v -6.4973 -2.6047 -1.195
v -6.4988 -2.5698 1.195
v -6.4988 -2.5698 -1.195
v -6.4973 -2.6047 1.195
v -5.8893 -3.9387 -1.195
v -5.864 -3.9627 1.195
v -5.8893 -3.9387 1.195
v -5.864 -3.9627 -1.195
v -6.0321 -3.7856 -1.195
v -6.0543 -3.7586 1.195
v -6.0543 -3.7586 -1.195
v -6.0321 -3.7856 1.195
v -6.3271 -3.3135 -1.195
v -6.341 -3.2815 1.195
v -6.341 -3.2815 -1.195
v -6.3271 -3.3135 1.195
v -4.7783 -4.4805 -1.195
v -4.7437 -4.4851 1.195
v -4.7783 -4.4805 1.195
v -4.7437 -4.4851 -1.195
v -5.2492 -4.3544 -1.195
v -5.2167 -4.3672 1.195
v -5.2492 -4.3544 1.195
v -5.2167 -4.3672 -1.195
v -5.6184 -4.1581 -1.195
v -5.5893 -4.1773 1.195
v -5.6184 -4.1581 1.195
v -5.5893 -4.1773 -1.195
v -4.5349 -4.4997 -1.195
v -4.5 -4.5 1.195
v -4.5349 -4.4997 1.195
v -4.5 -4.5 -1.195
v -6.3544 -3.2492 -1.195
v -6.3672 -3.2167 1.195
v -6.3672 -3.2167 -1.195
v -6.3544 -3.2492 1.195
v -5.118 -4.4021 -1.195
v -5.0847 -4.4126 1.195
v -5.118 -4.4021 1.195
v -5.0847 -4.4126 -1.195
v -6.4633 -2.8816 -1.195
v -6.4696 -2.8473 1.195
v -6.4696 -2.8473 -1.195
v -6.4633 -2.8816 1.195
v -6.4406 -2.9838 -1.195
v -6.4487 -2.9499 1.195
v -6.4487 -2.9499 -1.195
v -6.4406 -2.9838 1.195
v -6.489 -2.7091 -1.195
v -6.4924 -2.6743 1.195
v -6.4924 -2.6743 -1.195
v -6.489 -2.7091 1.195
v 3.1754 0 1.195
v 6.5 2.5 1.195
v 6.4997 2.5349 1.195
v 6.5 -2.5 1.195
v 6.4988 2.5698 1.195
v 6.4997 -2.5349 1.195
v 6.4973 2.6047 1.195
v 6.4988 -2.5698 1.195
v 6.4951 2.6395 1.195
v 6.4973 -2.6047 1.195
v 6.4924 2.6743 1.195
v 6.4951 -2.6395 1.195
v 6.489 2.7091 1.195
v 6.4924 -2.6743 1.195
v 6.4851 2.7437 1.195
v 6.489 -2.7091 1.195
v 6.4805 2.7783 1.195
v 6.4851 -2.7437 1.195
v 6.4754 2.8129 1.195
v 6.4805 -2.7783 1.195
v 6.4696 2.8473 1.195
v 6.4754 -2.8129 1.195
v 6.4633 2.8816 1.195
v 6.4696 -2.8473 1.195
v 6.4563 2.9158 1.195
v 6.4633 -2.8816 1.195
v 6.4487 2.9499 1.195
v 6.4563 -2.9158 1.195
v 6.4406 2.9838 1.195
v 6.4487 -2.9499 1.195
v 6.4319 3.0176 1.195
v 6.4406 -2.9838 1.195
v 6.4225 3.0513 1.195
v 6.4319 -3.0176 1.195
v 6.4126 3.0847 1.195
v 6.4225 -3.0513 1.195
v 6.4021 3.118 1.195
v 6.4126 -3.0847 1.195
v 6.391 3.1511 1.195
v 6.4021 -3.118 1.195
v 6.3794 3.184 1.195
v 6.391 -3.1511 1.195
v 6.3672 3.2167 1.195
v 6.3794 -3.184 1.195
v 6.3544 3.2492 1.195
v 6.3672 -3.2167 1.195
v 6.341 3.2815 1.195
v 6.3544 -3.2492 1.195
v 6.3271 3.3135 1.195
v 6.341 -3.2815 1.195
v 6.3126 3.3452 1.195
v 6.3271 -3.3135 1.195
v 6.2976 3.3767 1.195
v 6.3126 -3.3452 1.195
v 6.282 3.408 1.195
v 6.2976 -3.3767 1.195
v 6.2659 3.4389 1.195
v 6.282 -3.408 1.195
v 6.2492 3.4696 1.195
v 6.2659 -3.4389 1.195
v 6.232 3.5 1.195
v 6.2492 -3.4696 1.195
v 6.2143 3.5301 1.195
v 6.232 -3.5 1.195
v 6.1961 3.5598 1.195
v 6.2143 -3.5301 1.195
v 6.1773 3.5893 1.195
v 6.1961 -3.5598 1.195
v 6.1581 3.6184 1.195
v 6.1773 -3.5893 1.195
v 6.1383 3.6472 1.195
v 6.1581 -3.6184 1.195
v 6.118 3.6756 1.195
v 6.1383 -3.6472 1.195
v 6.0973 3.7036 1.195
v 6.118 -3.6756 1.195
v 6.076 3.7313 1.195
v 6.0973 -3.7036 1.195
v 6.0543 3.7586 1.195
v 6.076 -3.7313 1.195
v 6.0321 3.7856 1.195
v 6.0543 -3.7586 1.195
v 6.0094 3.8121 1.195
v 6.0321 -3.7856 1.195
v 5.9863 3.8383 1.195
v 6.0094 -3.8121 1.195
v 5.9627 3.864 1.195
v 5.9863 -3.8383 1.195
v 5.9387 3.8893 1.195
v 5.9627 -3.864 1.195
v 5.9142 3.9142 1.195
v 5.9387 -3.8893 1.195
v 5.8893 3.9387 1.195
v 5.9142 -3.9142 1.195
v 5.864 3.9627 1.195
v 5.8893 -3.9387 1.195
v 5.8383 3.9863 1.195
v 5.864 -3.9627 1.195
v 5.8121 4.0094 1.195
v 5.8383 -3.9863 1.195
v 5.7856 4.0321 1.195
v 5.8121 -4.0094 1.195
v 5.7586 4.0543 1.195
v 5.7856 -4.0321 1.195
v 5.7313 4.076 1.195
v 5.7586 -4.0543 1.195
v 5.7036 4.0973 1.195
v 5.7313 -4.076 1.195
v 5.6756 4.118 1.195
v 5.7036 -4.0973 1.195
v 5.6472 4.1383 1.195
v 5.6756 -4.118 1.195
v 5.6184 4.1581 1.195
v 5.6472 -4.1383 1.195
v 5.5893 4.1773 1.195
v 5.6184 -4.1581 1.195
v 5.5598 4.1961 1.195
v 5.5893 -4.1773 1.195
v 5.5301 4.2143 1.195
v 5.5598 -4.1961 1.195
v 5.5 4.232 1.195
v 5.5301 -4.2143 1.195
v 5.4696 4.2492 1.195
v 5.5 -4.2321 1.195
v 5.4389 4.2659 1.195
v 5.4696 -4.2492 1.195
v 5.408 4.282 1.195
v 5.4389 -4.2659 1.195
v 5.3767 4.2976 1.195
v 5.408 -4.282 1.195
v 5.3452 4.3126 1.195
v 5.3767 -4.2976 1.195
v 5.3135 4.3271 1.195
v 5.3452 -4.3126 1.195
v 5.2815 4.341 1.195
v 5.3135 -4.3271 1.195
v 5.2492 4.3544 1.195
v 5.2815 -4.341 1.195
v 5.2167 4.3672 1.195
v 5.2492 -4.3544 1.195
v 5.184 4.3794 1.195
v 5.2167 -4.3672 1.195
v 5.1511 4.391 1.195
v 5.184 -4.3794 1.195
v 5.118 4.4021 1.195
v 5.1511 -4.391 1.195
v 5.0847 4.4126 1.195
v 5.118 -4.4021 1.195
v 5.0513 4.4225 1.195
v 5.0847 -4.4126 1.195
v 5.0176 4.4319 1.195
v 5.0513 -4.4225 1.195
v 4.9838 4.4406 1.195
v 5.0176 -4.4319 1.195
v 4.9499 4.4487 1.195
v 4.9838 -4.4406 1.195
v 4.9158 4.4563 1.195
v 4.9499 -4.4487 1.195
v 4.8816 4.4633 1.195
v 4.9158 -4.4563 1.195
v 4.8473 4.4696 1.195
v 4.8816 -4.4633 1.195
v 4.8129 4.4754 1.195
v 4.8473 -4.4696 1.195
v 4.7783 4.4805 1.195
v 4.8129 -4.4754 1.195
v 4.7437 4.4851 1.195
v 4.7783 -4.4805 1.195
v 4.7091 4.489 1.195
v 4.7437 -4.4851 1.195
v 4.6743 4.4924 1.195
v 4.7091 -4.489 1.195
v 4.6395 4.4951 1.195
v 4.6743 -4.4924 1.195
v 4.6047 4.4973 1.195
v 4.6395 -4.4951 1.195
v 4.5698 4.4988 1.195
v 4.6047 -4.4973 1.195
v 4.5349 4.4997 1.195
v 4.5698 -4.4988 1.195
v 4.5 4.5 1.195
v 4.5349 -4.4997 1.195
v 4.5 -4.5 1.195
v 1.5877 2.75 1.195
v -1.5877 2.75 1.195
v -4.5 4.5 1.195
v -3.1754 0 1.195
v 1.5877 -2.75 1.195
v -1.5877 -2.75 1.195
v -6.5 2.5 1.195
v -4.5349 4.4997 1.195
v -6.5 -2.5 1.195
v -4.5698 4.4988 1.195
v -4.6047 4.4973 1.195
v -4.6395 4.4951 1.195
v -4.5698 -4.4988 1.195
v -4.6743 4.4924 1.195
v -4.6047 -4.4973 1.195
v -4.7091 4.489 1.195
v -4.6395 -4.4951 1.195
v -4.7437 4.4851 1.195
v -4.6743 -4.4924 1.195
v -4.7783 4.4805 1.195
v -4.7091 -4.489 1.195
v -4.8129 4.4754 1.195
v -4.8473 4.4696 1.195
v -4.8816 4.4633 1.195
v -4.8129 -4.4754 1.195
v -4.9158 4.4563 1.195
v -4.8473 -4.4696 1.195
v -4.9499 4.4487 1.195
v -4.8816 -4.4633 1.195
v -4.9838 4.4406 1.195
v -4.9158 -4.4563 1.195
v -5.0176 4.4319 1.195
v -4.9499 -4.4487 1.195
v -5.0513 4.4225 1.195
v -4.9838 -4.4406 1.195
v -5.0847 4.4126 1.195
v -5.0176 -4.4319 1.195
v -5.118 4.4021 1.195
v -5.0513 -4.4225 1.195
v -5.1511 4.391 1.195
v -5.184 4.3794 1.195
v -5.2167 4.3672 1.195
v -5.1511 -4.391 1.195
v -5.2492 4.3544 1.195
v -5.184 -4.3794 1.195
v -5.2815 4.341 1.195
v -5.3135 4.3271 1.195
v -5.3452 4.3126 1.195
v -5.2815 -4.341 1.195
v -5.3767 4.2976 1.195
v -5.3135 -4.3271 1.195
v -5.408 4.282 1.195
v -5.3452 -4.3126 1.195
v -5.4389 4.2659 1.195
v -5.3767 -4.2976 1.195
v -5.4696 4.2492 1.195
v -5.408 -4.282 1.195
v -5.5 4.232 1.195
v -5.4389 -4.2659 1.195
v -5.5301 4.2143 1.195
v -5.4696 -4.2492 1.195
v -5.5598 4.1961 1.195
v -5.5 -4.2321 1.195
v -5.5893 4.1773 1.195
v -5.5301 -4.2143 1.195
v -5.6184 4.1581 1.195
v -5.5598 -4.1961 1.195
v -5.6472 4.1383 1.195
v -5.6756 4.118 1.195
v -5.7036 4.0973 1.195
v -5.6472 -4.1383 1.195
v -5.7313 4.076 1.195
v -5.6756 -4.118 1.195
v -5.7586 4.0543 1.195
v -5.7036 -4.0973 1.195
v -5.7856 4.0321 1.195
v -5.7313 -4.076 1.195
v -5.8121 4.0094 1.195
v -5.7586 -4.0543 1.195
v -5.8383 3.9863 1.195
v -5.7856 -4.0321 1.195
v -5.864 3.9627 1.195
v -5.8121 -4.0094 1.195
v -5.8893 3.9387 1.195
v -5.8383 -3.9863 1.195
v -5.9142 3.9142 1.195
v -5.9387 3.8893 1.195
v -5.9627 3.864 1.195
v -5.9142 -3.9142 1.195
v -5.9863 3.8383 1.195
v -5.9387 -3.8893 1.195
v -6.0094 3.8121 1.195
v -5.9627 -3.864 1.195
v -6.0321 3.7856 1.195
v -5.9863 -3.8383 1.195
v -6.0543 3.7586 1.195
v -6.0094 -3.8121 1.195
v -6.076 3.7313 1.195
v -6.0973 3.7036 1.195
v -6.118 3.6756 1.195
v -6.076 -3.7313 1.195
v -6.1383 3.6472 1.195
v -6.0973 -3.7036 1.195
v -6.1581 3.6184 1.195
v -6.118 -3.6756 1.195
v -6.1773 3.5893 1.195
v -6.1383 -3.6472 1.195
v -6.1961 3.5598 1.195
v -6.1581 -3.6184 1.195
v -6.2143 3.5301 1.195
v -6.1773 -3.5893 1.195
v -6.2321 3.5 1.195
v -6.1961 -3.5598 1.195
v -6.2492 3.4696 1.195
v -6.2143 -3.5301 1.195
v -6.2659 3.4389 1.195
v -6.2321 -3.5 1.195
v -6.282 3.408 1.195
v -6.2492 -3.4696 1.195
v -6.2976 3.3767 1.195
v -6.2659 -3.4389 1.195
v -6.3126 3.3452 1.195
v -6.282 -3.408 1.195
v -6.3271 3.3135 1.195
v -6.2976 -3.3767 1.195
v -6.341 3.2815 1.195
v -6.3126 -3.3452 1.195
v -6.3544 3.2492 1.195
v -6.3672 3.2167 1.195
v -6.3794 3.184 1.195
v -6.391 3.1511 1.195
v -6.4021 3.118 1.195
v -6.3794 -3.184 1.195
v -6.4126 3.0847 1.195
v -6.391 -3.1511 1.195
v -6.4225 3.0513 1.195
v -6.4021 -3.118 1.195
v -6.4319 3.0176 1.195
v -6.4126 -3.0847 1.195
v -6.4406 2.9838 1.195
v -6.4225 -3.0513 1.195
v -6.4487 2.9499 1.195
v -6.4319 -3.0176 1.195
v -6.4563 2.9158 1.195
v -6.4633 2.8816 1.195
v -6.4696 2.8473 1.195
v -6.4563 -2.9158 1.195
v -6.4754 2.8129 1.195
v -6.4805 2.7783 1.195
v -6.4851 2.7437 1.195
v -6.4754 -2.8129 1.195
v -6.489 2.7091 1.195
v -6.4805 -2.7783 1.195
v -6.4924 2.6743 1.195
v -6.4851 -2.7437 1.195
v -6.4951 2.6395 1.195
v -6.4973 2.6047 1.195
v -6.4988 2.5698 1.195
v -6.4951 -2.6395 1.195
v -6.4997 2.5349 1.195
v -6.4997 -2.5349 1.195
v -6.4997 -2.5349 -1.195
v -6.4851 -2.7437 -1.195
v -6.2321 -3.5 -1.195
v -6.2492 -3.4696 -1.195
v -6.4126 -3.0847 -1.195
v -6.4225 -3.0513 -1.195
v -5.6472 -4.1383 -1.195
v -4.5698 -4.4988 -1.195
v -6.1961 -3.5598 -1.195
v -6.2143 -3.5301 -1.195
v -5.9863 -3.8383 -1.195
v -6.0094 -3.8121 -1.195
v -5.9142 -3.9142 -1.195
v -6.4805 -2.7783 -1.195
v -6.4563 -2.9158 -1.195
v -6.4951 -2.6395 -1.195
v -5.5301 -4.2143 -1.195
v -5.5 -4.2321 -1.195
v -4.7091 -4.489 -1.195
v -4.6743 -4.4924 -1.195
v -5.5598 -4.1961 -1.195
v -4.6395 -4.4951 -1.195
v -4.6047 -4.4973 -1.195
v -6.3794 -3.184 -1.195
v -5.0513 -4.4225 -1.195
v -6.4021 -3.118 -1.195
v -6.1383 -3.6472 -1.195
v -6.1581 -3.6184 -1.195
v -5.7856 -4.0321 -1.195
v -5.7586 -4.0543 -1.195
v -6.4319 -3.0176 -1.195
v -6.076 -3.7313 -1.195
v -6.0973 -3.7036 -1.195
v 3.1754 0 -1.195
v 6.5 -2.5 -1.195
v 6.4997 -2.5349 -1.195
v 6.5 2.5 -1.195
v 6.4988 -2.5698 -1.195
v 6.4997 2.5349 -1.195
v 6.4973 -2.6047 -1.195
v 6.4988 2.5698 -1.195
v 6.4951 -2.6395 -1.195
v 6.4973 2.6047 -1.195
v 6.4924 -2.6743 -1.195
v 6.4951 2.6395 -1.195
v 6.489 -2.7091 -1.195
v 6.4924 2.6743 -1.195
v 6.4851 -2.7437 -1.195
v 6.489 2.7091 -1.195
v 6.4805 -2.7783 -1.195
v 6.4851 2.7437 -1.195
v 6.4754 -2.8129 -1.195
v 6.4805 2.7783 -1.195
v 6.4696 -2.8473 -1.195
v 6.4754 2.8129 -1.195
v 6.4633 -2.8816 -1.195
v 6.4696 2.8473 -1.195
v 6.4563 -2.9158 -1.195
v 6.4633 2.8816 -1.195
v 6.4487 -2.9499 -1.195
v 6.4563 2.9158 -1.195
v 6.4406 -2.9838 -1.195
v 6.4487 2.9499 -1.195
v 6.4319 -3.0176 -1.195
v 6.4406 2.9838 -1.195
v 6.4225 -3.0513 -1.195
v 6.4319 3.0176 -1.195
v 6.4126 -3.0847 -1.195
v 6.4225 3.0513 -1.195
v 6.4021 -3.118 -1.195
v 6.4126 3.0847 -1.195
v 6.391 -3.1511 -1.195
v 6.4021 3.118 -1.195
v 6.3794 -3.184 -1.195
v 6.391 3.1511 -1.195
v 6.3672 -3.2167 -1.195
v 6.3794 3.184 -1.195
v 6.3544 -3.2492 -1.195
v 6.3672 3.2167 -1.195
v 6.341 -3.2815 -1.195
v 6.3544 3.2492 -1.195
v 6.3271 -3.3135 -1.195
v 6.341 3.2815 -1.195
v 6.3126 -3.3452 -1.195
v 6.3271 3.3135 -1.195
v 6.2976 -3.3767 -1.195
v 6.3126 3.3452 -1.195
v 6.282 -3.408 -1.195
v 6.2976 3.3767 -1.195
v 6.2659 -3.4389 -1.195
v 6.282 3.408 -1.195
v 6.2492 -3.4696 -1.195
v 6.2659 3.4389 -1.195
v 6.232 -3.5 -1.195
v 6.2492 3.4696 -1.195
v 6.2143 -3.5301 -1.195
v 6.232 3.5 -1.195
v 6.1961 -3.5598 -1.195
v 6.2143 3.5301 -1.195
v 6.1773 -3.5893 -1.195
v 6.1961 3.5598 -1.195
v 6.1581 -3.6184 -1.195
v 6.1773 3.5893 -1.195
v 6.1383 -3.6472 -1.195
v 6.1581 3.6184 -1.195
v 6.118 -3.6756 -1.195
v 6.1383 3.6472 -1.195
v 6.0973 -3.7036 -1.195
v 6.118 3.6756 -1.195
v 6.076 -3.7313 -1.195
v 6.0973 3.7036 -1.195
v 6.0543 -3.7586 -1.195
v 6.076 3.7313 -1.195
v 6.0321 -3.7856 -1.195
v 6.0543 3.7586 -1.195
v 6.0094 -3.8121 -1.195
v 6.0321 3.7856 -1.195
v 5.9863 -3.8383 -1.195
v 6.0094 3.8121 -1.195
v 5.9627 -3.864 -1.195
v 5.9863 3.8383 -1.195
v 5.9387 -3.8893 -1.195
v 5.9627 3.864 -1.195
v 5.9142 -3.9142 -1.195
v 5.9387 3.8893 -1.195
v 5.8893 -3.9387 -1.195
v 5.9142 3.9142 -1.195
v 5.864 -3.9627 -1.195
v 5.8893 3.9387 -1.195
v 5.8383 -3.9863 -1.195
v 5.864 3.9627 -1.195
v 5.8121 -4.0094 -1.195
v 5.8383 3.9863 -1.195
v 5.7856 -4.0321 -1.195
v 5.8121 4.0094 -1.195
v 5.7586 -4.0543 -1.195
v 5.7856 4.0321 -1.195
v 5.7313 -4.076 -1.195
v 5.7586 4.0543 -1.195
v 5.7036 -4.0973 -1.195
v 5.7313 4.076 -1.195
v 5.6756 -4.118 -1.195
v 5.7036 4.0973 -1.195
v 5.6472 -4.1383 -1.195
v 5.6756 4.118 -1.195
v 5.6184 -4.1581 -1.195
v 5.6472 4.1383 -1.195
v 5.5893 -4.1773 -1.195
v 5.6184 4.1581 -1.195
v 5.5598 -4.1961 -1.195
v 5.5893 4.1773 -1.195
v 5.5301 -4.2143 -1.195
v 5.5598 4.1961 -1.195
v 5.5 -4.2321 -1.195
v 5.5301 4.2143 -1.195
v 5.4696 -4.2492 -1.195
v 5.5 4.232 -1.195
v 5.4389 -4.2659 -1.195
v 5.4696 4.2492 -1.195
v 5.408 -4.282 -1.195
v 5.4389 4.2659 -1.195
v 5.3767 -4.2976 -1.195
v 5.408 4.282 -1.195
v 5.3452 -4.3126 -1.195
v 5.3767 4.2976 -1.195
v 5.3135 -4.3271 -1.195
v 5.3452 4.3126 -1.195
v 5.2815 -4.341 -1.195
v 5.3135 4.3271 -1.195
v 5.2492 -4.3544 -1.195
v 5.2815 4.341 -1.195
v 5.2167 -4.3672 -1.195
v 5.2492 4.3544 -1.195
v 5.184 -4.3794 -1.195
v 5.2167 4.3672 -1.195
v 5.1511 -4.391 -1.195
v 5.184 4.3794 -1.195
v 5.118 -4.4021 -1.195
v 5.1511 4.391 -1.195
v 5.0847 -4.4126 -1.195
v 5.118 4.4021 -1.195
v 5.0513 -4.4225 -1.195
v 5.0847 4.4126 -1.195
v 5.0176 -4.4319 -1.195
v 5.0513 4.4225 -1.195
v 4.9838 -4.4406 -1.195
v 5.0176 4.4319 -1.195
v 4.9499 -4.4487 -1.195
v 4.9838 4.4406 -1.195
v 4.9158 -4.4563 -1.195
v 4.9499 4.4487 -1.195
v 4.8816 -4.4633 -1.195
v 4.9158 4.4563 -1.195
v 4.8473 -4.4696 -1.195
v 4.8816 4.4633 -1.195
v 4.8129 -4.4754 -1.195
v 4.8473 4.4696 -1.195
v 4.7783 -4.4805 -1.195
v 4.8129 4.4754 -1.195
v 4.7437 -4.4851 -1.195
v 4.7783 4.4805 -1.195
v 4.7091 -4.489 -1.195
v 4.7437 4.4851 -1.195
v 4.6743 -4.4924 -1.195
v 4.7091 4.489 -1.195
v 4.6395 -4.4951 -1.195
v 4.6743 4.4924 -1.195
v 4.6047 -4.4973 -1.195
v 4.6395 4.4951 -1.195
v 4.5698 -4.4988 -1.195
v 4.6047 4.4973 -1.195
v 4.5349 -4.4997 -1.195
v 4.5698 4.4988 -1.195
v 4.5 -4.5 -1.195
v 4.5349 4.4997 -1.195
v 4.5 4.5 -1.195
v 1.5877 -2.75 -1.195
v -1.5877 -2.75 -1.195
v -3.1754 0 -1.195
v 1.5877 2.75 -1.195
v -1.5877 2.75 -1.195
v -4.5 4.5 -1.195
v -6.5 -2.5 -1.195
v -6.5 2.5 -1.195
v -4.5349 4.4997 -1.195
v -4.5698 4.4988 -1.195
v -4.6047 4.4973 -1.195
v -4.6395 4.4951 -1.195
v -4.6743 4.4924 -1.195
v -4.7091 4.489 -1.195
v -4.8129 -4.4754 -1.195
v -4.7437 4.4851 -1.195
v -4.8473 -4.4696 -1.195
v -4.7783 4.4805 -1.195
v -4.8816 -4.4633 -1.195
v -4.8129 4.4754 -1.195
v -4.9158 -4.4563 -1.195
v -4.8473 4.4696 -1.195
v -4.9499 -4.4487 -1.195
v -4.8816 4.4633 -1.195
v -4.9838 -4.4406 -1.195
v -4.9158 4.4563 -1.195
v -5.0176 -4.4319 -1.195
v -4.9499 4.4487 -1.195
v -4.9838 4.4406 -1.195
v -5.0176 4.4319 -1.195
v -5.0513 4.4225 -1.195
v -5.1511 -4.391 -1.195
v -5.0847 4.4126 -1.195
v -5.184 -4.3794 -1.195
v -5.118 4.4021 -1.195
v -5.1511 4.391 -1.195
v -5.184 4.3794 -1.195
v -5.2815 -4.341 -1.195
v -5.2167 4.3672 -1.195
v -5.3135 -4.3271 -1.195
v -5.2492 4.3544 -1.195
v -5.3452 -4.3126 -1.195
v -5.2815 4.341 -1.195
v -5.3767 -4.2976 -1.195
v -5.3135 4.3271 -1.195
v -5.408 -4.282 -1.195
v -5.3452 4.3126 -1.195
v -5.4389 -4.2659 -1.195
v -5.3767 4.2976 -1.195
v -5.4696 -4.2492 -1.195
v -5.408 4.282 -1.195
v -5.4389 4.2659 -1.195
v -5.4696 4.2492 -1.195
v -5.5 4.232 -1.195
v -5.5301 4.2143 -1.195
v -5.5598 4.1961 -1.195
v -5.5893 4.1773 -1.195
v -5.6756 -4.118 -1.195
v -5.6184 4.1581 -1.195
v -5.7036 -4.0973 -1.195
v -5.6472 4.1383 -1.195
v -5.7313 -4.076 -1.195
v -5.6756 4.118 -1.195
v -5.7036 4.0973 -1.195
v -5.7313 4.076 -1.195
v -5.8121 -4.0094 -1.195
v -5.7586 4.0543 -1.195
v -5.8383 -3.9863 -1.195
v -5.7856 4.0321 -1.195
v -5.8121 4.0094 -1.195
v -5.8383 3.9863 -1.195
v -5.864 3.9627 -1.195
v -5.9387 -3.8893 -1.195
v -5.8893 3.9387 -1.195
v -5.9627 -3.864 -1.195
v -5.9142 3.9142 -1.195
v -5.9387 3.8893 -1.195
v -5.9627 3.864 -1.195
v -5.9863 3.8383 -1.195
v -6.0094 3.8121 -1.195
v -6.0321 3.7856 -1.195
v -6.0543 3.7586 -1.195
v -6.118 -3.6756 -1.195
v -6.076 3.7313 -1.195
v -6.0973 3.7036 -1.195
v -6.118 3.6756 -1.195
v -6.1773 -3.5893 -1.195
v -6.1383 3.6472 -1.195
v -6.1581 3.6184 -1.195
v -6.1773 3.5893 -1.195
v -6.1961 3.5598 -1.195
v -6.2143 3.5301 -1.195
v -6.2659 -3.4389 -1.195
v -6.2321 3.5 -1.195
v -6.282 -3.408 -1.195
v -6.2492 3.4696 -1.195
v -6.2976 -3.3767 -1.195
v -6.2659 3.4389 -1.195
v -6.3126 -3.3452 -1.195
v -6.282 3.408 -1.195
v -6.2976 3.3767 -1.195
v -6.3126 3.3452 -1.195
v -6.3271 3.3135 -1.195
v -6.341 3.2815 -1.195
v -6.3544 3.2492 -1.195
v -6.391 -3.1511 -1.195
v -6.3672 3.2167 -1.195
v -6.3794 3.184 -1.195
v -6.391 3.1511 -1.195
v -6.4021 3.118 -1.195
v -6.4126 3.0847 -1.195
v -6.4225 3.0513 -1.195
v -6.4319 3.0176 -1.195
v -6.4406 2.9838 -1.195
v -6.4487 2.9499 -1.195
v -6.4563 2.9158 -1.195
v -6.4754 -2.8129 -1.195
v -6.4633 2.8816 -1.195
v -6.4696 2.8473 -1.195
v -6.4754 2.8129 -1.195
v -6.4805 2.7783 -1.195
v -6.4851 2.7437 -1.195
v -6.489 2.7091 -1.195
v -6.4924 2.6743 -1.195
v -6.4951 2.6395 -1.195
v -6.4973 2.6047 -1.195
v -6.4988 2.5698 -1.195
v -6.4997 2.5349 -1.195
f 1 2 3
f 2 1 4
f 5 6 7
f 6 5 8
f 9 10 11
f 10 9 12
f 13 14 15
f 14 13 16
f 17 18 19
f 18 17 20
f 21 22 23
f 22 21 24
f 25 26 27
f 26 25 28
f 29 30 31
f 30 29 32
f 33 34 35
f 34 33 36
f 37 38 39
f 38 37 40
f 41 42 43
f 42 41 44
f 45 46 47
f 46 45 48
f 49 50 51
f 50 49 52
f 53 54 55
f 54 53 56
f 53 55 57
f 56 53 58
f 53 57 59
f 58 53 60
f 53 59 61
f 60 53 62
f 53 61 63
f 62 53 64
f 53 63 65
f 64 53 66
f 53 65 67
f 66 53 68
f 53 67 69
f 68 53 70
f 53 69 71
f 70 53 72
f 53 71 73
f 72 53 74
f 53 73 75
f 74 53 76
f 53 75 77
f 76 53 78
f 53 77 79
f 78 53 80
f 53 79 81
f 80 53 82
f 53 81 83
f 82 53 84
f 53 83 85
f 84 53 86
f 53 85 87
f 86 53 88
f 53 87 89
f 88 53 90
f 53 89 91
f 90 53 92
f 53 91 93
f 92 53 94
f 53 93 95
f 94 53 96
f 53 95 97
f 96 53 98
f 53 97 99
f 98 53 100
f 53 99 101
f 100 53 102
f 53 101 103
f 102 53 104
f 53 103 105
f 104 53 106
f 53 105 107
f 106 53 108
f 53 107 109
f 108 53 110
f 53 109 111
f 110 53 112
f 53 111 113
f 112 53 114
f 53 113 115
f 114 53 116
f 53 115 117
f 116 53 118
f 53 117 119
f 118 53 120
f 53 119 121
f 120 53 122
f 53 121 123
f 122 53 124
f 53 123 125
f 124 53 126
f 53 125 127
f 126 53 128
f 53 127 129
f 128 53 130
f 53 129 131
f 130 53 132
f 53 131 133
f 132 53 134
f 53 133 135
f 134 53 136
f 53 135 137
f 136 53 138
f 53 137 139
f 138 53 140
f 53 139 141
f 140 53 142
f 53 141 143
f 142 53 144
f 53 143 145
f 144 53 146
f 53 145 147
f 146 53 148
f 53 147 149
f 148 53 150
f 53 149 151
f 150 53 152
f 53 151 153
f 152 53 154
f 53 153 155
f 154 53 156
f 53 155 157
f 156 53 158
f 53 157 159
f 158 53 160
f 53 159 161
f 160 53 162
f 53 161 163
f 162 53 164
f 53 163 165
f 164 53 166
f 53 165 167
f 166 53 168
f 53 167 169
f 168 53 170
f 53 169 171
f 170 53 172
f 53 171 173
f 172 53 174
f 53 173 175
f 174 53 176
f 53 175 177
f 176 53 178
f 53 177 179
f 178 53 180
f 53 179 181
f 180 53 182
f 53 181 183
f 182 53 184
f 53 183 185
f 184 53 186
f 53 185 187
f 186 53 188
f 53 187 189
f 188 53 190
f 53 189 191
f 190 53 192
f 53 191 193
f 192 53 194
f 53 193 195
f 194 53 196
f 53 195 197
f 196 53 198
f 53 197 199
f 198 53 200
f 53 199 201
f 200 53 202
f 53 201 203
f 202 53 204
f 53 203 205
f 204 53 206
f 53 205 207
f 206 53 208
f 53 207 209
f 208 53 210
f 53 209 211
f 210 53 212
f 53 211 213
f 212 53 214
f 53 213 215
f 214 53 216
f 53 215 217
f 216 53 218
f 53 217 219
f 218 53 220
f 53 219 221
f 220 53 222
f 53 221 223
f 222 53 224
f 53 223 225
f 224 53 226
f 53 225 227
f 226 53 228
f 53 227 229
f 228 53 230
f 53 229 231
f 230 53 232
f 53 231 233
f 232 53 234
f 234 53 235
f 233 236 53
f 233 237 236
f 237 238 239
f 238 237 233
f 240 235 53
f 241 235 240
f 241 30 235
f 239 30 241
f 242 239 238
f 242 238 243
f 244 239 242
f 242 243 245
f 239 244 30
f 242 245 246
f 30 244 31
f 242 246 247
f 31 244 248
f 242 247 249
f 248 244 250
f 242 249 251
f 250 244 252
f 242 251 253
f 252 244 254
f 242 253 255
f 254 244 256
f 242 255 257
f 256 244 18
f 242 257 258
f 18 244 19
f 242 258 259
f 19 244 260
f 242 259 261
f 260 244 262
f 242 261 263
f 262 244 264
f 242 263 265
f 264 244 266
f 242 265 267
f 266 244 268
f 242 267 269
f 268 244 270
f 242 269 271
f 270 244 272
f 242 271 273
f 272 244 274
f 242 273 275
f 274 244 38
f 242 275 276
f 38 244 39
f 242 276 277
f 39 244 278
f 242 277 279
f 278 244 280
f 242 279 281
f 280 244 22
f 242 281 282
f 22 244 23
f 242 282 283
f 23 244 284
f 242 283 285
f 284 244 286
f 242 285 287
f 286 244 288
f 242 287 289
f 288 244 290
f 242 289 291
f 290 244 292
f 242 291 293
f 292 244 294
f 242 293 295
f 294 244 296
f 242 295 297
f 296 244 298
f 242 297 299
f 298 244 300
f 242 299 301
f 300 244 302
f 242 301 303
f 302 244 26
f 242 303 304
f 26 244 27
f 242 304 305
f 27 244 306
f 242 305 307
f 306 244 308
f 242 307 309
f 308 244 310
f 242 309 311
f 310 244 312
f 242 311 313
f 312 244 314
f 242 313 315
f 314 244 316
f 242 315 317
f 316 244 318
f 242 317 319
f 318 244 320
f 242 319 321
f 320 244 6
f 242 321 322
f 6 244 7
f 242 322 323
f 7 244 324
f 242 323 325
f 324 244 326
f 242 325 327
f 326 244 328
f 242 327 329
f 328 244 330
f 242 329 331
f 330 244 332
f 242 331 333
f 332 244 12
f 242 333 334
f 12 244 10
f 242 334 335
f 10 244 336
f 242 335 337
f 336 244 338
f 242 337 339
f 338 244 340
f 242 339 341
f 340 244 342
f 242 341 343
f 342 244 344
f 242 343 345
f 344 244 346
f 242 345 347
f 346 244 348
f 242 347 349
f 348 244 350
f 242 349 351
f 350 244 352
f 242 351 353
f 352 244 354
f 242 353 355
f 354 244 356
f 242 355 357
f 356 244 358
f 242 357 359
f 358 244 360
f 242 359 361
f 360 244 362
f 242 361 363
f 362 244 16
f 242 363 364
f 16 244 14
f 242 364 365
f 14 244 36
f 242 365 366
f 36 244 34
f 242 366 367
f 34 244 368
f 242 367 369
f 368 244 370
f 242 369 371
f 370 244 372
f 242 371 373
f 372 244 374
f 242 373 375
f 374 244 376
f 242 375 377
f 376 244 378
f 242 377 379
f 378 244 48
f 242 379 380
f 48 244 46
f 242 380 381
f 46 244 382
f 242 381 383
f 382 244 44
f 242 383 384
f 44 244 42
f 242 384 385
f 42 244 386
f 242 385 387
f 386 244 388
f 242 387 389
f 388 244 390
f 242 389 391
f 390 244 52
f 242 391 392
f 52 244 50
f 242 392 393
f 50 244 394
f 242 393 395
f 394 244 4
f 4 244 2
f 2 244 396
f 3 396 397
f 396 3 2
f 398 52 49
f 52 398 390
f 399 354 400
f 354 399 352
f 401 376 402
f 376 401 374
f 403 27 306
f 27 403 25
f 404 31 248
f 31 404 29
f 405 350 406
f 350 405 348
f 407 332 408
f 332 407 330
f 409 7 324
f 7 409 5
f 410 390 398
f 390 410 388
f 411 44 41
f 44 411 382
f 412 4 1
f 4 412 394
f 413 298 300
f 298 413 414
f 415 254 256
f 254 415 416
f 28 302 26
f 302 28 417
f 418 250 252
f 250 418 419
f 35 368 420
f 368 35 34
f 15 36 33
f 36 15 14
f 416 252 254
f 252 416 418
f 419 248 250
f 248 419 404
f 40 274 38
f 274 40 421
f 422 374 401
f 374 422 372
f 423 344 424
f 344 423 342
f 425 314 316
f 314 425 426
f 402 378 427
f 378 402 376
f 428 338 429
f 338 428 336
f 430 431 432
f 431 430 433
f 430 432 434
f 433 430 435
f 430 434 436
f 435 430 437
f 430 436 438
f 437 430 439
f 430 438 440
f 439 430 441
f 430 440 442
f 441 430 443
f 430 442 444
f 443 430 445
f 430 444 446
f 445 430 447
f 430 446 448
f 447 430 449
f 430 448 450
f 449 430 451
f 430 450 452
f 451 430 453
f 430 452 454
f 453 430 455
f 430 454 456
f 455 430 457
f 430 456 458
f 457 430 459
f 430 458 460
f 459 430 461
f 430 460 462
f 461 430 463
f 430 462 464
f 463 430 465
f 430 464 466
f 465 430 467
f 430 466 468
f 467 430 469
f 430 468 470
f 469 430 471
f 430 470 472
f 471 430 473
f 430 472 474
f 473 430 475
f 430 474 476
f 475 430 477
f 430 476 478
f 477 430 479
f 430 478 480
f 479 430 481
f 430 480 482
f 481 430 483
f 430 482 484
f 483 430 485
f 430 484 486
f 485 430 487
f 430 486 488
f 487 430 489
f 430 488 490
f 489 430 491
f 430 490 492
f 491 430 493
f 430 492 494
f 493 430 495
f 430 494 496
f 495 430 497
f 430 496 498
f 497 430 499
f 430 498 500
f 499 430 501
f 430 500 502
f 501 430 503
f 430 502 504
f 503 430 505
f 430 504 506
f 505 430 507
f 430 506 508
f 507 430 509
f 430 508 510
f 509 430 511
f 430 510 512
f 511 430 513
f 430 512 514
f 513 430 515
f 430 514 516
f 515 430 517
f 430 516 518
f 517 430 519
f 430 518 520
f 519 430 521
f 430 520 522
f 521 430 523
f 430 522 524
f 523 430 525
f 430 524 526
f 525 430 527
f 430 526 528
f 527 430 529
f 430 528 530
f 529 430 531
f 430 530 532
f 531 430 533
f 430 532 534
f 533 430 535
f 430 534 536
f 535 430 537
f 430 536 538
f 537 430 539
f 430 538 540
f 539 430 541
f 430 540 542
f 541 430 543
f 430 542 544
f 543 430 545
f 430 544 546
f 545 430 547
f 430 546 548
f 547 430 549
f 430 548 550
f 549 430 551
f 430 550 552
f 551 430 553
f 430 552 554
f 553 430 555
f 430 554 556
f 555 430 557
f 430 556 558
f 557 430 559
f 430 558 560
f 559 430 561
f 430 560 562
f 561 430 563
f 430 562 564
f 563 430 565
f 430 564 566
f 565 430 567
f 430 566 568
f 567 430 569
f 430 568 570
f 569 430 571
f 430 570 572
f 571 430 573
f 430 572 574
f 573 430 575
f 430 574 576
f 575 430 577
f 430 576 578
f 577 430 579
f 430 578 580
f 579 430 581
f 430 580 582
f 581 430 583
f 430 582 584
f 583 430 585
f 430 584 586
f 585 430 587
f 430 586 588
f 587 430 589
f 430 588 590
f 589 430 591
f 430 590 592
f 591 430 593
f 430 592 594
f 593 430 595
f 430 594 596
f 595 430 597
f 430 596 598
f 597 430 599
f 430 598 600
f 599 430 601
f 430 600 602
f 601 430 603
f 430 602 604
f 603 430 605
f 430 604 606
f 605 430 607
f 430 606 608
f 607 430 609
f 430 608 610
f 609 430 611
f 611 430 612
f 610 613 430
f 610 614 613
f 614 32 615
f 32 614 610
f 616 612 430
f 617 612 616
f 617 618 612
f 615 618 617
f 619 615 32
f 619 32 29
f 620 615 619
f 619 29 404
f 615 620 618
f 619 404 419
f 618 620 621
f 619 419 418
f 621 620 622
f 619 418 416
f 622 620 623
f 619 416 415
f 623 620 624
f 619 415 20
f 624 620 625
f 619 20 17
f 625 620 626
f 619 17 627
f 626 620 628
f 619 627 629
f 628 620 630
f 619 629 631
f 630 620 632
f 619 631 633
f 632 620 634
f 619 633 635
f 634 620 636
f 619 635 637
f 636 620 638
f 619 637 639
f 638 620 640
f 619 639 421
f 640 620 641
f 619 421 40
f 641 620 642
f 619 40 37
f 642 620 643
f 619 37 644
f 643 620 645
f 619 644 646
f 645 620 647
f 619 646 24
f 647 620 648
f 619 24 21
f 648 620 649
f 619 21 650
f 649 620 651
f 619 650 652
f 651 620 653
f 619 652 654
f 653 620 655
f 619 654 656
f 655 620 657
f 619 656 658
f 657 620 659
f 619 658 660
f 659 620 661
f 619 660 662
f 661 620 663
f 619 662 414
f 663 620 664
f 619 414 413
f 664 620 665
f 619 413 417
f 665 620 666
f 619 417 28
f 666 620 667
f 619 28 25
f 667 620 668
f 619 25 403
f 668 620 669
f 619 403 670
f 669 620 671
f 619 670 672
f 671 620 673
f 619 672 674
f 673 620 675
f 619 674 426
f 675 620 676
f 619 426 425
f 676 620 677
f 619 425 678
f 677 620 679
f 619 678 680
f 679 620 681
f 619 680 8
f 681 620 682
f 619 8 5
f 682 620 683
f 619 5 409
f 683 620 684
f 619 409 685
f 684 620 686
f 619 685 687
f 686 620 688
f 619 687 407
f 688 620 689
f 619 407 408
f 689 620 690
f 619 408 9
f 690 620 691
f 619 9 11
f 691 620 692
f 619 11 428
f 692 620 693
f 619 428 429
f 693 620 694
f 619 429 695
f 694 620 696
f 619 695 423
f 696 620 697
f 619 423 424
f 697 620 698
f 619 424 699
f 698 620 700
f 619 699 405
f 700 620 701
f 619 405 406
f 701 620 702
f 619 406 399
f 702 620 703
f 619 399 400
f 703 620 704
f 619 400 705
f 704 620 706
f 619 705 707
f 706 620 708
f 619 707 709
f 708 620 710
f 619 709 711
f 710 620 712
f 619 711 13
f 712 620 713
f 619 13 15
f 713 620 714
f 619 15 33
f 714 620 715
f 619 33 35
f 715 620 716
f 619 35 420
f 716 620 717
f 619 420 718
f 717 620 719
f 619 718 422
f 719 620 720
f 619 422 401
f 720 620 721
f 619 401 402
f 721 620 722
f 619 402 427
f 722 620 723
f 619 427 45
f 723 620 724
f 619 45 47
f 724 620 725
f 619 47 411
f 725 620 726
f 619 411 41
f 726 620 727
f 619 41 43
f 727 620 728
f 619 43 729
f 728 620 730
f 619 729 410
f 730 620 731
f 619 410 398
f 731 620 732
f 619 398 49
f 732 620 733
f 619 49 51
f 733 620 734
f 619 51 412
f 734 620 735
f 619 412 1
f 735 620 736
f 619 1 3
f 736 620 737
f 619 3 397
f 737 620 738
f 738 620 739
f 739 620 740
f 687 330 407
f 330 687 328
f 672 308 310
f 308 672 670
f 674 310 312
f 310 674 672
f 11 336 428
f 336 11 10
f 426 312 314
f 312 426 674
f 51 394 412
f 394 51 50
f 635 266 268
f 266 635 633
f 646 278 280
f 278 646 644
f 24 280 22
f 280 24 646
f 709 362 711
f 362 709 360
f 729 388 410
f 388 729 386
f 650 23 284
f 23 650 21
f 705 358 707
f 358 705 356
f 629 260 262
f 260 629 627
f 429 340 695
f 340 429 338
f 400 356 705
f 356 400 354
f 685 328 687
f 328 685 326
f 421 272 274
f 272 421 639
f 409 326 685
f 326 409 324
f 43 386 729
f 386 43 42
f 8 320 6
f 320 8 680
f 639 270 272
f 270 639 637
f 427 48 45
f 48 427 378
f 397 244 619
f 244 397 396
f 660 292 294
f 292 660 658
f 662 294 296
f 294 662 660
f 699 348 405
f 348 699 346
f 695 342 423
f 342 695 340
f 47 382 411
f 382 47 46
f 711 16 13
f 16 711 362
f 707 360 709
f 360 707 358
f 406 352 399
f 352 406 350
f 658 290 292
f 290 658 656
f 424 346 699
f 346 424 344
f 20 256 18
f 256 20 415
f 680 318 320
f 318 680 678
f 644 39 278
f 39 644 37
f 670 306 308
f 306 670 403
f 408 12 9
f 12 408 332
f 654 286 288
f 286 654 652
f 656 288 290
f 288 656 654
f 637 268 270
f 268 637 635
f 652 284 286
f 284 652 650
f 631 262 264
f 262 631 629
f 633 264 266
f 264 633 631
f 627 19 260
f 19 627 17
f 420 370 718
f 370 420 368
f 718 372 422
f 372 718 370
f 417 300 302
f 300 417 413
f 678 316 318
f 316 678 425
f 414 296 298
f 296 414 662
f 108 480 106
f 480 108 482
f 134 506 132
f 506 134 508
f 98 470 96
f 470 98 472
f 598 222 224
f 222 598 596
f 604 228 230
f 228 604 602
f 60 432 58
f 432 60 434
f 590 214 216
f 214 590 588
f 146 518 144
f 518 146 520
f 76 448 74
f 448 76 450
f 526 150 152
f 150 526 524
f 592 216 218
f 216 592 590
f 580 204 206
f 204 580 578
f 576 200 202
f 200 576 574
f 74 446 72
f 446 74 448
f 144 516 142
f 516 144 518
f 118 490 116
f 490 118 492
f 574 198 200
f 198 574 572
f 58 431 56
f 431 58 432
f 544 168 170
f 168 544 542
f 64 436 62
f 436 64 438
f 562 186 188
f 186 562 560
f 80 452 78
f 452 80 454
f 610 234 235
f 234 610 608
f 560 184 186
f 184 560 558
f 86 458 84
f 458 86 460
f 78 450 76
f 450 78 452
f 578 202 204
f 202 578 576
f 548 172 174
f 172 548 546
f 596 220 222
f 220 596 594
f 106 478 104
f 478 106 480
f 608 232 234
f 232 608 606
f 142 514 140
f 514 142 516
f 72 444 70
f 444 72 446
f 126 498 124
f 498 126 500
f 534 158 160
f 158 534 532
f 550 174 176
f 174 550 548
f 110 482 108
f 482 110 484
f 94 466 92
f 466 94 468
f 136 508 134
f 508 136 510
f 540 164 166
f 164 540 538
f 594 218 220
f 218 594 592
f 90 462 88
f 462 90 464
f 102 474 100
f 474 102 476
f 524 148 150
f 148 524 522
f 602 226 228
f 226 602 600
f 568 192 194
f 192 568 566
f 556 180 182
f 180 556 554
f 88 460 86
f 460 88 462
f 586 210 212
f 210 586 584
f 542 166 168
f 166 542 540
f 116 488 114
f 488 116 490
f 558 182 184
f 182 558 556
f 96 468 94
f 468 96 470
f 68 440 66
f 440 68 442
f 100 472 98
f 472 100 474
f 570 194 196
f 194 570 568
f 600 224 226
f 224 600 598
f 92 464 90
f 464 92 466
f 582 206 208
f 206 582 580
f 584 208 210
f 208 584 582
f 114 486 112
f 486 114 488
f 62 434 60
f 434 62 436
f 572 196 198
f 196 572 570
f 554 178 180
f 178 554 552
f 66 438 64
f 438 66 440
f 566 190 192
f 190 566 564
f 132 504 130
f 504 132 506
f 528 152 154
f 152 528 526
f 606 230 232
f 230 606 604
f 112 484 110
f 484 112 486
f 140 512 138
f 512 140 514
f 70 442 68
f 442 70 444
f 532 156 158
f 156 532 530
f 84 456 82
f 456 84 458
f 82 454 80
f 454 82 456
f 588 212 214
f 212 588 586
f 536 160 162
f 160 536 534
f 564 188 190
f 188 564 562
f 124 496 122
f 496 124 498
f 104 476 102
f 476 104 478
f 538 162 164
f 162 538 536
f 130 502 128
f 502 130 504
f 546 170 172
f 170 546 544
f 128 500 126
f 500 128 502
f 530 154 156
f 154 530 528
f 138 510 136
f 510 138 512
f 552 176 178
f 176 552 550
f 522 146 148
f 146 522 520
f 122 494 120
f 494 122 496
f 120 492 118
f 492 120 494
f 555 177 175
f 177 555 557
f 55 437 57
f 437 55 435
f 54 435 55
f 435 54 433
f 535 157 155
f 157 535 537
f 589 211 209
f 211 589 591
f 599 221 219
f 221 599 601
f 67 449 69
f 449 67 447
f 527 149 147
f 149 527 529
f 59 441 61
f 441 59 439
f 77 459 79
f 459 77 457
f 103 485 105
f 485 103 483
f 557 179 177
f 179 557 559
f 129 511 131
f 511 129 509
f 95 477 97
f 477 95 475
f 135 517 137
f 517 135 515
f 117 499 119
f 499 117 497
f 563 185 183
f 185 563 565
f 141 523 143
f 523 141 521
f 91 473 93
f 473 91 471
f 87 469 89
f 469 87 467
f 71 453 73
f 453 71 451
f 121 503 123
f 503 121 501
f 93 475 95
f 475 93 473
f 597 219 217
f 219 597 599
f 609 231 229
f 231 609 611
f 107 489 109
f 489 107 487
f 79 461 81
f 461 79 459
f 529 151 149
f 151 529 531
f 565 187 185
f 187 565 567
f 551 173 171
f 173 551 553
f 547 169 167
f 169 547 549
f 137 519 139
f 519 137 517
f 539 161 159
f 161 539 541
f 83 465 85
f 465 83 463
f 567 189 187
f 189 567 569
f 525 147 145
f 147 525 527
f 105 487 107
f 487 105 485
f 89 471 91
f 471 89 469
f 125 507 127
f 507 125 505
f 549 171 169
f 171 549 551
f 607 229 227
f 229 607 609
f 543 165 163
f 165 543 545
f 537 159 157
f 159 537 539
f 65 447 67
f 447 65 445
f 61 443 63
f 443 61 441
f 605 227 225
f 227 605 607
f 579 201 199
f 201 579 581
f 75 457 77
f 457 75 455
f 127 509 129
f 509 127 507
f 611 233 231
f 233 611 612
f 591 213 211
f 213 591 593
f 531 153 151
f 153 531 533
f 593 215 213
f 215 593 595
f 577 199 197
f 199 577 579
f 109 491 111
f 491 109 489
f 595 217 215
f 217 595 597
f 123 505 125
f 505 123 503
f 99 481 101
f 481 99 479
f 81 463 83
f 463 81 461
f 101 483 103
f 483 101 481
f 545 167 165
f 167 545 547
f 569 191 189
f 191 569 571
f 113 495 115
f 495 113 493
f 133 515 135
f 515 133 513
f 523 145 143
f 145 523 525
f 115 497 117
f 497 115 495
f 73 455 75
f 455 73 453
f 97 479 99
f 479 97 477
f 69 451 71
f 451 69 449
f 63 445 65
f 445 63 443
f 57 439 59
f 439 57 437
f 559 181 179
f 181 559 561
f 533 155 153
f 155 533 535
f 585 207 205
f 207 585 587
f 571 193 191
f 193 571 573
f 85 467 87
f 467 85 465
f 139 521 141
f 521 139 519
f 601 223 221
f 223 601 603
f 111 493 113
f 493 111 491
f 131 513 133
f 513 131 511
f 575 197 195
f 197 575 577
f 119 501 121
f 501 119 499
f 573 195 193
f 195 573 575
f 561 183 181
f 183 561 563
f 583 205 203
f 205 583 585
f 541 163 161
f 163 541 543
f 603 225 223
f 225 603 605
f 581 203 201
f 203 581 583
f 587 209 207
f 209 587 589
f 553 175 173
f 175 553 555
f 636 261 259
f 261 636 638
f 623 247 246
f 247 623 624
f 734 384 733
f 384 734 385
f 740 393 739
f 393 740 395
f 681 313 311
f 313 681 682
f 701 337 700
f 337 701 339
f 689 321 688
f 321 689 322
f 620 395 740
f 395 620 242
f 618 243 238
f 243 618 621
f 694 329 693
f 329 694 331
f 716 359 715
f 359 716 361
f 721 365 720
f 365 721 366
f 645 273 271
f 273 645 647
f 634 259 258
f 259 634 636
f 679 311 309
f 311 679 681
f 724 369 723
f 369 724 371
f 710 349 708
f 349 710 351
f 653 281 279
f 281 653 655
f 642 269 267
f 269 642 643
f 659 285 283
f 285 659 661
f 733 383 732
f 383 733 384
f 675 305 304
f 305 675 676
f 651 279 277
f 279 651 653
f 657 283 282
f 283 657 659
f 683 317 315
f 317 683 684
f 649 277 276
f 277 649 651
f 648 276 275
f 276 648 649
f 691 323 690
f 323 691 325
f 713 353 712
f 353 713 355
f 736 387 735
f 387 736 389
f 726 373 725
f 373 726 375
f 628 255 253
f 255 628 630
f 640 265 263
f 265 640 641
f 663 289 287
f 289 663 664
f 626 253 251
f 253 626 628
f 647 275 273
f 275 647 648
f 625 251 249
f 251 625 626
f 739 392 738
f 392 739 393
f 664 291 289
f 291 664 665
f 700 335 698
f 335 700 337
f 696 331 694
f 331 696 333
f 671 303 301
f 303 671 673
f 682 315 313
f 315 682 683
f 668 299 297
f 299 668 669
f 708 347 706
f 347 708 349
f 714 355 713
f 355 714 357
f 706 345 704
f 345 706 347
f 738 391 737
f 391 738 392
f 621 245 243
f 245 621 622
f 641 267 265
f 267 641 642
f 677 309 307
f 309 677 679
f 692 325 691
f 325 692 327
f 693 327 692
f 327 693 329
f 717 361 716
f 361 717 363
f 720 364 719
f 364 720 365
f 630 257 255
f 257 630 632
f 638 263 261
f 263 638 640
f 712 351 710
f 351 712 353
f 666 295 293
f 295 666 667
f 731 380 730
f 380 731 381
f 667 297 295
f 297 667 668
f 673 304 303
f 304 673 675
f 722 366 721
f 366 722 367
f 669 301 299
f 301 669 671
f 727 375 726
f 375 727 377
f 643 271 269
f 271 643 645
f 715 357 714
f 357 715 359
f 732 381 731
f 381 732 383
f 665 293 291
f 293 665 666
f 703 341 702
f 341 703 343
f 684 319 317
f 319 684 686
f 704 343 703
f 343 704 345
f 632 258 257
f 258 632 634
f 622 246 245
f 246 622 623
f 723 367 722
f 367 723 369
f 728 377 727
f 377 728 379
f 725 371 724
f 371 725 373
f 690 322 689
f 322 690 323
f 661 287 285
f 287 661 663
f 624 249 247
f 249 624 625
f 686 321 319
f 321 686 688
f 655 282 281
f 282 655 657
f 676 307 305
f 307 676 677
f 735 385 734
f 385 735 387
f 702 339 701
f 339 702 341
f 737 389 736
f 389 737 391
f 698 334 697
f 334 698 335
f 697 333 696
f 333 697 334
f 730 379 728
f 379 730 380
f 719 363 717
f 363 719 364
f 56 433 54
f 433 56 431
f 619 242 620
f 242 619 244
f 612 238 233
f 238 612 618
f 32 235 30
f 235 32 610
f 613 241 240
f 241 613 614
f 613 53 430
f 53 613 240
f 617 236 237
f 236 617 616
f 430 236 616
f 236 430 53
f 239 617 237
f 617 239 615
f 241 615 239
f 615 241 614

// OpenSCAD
use <../../lib/Engineering_tools.scad>;

difference() {
    roundRect(size=[13,9,2.39], round=2, center=true);
    #hexNut(size="M3", center=true, outline=true, pos=[0,0,0]);

}
